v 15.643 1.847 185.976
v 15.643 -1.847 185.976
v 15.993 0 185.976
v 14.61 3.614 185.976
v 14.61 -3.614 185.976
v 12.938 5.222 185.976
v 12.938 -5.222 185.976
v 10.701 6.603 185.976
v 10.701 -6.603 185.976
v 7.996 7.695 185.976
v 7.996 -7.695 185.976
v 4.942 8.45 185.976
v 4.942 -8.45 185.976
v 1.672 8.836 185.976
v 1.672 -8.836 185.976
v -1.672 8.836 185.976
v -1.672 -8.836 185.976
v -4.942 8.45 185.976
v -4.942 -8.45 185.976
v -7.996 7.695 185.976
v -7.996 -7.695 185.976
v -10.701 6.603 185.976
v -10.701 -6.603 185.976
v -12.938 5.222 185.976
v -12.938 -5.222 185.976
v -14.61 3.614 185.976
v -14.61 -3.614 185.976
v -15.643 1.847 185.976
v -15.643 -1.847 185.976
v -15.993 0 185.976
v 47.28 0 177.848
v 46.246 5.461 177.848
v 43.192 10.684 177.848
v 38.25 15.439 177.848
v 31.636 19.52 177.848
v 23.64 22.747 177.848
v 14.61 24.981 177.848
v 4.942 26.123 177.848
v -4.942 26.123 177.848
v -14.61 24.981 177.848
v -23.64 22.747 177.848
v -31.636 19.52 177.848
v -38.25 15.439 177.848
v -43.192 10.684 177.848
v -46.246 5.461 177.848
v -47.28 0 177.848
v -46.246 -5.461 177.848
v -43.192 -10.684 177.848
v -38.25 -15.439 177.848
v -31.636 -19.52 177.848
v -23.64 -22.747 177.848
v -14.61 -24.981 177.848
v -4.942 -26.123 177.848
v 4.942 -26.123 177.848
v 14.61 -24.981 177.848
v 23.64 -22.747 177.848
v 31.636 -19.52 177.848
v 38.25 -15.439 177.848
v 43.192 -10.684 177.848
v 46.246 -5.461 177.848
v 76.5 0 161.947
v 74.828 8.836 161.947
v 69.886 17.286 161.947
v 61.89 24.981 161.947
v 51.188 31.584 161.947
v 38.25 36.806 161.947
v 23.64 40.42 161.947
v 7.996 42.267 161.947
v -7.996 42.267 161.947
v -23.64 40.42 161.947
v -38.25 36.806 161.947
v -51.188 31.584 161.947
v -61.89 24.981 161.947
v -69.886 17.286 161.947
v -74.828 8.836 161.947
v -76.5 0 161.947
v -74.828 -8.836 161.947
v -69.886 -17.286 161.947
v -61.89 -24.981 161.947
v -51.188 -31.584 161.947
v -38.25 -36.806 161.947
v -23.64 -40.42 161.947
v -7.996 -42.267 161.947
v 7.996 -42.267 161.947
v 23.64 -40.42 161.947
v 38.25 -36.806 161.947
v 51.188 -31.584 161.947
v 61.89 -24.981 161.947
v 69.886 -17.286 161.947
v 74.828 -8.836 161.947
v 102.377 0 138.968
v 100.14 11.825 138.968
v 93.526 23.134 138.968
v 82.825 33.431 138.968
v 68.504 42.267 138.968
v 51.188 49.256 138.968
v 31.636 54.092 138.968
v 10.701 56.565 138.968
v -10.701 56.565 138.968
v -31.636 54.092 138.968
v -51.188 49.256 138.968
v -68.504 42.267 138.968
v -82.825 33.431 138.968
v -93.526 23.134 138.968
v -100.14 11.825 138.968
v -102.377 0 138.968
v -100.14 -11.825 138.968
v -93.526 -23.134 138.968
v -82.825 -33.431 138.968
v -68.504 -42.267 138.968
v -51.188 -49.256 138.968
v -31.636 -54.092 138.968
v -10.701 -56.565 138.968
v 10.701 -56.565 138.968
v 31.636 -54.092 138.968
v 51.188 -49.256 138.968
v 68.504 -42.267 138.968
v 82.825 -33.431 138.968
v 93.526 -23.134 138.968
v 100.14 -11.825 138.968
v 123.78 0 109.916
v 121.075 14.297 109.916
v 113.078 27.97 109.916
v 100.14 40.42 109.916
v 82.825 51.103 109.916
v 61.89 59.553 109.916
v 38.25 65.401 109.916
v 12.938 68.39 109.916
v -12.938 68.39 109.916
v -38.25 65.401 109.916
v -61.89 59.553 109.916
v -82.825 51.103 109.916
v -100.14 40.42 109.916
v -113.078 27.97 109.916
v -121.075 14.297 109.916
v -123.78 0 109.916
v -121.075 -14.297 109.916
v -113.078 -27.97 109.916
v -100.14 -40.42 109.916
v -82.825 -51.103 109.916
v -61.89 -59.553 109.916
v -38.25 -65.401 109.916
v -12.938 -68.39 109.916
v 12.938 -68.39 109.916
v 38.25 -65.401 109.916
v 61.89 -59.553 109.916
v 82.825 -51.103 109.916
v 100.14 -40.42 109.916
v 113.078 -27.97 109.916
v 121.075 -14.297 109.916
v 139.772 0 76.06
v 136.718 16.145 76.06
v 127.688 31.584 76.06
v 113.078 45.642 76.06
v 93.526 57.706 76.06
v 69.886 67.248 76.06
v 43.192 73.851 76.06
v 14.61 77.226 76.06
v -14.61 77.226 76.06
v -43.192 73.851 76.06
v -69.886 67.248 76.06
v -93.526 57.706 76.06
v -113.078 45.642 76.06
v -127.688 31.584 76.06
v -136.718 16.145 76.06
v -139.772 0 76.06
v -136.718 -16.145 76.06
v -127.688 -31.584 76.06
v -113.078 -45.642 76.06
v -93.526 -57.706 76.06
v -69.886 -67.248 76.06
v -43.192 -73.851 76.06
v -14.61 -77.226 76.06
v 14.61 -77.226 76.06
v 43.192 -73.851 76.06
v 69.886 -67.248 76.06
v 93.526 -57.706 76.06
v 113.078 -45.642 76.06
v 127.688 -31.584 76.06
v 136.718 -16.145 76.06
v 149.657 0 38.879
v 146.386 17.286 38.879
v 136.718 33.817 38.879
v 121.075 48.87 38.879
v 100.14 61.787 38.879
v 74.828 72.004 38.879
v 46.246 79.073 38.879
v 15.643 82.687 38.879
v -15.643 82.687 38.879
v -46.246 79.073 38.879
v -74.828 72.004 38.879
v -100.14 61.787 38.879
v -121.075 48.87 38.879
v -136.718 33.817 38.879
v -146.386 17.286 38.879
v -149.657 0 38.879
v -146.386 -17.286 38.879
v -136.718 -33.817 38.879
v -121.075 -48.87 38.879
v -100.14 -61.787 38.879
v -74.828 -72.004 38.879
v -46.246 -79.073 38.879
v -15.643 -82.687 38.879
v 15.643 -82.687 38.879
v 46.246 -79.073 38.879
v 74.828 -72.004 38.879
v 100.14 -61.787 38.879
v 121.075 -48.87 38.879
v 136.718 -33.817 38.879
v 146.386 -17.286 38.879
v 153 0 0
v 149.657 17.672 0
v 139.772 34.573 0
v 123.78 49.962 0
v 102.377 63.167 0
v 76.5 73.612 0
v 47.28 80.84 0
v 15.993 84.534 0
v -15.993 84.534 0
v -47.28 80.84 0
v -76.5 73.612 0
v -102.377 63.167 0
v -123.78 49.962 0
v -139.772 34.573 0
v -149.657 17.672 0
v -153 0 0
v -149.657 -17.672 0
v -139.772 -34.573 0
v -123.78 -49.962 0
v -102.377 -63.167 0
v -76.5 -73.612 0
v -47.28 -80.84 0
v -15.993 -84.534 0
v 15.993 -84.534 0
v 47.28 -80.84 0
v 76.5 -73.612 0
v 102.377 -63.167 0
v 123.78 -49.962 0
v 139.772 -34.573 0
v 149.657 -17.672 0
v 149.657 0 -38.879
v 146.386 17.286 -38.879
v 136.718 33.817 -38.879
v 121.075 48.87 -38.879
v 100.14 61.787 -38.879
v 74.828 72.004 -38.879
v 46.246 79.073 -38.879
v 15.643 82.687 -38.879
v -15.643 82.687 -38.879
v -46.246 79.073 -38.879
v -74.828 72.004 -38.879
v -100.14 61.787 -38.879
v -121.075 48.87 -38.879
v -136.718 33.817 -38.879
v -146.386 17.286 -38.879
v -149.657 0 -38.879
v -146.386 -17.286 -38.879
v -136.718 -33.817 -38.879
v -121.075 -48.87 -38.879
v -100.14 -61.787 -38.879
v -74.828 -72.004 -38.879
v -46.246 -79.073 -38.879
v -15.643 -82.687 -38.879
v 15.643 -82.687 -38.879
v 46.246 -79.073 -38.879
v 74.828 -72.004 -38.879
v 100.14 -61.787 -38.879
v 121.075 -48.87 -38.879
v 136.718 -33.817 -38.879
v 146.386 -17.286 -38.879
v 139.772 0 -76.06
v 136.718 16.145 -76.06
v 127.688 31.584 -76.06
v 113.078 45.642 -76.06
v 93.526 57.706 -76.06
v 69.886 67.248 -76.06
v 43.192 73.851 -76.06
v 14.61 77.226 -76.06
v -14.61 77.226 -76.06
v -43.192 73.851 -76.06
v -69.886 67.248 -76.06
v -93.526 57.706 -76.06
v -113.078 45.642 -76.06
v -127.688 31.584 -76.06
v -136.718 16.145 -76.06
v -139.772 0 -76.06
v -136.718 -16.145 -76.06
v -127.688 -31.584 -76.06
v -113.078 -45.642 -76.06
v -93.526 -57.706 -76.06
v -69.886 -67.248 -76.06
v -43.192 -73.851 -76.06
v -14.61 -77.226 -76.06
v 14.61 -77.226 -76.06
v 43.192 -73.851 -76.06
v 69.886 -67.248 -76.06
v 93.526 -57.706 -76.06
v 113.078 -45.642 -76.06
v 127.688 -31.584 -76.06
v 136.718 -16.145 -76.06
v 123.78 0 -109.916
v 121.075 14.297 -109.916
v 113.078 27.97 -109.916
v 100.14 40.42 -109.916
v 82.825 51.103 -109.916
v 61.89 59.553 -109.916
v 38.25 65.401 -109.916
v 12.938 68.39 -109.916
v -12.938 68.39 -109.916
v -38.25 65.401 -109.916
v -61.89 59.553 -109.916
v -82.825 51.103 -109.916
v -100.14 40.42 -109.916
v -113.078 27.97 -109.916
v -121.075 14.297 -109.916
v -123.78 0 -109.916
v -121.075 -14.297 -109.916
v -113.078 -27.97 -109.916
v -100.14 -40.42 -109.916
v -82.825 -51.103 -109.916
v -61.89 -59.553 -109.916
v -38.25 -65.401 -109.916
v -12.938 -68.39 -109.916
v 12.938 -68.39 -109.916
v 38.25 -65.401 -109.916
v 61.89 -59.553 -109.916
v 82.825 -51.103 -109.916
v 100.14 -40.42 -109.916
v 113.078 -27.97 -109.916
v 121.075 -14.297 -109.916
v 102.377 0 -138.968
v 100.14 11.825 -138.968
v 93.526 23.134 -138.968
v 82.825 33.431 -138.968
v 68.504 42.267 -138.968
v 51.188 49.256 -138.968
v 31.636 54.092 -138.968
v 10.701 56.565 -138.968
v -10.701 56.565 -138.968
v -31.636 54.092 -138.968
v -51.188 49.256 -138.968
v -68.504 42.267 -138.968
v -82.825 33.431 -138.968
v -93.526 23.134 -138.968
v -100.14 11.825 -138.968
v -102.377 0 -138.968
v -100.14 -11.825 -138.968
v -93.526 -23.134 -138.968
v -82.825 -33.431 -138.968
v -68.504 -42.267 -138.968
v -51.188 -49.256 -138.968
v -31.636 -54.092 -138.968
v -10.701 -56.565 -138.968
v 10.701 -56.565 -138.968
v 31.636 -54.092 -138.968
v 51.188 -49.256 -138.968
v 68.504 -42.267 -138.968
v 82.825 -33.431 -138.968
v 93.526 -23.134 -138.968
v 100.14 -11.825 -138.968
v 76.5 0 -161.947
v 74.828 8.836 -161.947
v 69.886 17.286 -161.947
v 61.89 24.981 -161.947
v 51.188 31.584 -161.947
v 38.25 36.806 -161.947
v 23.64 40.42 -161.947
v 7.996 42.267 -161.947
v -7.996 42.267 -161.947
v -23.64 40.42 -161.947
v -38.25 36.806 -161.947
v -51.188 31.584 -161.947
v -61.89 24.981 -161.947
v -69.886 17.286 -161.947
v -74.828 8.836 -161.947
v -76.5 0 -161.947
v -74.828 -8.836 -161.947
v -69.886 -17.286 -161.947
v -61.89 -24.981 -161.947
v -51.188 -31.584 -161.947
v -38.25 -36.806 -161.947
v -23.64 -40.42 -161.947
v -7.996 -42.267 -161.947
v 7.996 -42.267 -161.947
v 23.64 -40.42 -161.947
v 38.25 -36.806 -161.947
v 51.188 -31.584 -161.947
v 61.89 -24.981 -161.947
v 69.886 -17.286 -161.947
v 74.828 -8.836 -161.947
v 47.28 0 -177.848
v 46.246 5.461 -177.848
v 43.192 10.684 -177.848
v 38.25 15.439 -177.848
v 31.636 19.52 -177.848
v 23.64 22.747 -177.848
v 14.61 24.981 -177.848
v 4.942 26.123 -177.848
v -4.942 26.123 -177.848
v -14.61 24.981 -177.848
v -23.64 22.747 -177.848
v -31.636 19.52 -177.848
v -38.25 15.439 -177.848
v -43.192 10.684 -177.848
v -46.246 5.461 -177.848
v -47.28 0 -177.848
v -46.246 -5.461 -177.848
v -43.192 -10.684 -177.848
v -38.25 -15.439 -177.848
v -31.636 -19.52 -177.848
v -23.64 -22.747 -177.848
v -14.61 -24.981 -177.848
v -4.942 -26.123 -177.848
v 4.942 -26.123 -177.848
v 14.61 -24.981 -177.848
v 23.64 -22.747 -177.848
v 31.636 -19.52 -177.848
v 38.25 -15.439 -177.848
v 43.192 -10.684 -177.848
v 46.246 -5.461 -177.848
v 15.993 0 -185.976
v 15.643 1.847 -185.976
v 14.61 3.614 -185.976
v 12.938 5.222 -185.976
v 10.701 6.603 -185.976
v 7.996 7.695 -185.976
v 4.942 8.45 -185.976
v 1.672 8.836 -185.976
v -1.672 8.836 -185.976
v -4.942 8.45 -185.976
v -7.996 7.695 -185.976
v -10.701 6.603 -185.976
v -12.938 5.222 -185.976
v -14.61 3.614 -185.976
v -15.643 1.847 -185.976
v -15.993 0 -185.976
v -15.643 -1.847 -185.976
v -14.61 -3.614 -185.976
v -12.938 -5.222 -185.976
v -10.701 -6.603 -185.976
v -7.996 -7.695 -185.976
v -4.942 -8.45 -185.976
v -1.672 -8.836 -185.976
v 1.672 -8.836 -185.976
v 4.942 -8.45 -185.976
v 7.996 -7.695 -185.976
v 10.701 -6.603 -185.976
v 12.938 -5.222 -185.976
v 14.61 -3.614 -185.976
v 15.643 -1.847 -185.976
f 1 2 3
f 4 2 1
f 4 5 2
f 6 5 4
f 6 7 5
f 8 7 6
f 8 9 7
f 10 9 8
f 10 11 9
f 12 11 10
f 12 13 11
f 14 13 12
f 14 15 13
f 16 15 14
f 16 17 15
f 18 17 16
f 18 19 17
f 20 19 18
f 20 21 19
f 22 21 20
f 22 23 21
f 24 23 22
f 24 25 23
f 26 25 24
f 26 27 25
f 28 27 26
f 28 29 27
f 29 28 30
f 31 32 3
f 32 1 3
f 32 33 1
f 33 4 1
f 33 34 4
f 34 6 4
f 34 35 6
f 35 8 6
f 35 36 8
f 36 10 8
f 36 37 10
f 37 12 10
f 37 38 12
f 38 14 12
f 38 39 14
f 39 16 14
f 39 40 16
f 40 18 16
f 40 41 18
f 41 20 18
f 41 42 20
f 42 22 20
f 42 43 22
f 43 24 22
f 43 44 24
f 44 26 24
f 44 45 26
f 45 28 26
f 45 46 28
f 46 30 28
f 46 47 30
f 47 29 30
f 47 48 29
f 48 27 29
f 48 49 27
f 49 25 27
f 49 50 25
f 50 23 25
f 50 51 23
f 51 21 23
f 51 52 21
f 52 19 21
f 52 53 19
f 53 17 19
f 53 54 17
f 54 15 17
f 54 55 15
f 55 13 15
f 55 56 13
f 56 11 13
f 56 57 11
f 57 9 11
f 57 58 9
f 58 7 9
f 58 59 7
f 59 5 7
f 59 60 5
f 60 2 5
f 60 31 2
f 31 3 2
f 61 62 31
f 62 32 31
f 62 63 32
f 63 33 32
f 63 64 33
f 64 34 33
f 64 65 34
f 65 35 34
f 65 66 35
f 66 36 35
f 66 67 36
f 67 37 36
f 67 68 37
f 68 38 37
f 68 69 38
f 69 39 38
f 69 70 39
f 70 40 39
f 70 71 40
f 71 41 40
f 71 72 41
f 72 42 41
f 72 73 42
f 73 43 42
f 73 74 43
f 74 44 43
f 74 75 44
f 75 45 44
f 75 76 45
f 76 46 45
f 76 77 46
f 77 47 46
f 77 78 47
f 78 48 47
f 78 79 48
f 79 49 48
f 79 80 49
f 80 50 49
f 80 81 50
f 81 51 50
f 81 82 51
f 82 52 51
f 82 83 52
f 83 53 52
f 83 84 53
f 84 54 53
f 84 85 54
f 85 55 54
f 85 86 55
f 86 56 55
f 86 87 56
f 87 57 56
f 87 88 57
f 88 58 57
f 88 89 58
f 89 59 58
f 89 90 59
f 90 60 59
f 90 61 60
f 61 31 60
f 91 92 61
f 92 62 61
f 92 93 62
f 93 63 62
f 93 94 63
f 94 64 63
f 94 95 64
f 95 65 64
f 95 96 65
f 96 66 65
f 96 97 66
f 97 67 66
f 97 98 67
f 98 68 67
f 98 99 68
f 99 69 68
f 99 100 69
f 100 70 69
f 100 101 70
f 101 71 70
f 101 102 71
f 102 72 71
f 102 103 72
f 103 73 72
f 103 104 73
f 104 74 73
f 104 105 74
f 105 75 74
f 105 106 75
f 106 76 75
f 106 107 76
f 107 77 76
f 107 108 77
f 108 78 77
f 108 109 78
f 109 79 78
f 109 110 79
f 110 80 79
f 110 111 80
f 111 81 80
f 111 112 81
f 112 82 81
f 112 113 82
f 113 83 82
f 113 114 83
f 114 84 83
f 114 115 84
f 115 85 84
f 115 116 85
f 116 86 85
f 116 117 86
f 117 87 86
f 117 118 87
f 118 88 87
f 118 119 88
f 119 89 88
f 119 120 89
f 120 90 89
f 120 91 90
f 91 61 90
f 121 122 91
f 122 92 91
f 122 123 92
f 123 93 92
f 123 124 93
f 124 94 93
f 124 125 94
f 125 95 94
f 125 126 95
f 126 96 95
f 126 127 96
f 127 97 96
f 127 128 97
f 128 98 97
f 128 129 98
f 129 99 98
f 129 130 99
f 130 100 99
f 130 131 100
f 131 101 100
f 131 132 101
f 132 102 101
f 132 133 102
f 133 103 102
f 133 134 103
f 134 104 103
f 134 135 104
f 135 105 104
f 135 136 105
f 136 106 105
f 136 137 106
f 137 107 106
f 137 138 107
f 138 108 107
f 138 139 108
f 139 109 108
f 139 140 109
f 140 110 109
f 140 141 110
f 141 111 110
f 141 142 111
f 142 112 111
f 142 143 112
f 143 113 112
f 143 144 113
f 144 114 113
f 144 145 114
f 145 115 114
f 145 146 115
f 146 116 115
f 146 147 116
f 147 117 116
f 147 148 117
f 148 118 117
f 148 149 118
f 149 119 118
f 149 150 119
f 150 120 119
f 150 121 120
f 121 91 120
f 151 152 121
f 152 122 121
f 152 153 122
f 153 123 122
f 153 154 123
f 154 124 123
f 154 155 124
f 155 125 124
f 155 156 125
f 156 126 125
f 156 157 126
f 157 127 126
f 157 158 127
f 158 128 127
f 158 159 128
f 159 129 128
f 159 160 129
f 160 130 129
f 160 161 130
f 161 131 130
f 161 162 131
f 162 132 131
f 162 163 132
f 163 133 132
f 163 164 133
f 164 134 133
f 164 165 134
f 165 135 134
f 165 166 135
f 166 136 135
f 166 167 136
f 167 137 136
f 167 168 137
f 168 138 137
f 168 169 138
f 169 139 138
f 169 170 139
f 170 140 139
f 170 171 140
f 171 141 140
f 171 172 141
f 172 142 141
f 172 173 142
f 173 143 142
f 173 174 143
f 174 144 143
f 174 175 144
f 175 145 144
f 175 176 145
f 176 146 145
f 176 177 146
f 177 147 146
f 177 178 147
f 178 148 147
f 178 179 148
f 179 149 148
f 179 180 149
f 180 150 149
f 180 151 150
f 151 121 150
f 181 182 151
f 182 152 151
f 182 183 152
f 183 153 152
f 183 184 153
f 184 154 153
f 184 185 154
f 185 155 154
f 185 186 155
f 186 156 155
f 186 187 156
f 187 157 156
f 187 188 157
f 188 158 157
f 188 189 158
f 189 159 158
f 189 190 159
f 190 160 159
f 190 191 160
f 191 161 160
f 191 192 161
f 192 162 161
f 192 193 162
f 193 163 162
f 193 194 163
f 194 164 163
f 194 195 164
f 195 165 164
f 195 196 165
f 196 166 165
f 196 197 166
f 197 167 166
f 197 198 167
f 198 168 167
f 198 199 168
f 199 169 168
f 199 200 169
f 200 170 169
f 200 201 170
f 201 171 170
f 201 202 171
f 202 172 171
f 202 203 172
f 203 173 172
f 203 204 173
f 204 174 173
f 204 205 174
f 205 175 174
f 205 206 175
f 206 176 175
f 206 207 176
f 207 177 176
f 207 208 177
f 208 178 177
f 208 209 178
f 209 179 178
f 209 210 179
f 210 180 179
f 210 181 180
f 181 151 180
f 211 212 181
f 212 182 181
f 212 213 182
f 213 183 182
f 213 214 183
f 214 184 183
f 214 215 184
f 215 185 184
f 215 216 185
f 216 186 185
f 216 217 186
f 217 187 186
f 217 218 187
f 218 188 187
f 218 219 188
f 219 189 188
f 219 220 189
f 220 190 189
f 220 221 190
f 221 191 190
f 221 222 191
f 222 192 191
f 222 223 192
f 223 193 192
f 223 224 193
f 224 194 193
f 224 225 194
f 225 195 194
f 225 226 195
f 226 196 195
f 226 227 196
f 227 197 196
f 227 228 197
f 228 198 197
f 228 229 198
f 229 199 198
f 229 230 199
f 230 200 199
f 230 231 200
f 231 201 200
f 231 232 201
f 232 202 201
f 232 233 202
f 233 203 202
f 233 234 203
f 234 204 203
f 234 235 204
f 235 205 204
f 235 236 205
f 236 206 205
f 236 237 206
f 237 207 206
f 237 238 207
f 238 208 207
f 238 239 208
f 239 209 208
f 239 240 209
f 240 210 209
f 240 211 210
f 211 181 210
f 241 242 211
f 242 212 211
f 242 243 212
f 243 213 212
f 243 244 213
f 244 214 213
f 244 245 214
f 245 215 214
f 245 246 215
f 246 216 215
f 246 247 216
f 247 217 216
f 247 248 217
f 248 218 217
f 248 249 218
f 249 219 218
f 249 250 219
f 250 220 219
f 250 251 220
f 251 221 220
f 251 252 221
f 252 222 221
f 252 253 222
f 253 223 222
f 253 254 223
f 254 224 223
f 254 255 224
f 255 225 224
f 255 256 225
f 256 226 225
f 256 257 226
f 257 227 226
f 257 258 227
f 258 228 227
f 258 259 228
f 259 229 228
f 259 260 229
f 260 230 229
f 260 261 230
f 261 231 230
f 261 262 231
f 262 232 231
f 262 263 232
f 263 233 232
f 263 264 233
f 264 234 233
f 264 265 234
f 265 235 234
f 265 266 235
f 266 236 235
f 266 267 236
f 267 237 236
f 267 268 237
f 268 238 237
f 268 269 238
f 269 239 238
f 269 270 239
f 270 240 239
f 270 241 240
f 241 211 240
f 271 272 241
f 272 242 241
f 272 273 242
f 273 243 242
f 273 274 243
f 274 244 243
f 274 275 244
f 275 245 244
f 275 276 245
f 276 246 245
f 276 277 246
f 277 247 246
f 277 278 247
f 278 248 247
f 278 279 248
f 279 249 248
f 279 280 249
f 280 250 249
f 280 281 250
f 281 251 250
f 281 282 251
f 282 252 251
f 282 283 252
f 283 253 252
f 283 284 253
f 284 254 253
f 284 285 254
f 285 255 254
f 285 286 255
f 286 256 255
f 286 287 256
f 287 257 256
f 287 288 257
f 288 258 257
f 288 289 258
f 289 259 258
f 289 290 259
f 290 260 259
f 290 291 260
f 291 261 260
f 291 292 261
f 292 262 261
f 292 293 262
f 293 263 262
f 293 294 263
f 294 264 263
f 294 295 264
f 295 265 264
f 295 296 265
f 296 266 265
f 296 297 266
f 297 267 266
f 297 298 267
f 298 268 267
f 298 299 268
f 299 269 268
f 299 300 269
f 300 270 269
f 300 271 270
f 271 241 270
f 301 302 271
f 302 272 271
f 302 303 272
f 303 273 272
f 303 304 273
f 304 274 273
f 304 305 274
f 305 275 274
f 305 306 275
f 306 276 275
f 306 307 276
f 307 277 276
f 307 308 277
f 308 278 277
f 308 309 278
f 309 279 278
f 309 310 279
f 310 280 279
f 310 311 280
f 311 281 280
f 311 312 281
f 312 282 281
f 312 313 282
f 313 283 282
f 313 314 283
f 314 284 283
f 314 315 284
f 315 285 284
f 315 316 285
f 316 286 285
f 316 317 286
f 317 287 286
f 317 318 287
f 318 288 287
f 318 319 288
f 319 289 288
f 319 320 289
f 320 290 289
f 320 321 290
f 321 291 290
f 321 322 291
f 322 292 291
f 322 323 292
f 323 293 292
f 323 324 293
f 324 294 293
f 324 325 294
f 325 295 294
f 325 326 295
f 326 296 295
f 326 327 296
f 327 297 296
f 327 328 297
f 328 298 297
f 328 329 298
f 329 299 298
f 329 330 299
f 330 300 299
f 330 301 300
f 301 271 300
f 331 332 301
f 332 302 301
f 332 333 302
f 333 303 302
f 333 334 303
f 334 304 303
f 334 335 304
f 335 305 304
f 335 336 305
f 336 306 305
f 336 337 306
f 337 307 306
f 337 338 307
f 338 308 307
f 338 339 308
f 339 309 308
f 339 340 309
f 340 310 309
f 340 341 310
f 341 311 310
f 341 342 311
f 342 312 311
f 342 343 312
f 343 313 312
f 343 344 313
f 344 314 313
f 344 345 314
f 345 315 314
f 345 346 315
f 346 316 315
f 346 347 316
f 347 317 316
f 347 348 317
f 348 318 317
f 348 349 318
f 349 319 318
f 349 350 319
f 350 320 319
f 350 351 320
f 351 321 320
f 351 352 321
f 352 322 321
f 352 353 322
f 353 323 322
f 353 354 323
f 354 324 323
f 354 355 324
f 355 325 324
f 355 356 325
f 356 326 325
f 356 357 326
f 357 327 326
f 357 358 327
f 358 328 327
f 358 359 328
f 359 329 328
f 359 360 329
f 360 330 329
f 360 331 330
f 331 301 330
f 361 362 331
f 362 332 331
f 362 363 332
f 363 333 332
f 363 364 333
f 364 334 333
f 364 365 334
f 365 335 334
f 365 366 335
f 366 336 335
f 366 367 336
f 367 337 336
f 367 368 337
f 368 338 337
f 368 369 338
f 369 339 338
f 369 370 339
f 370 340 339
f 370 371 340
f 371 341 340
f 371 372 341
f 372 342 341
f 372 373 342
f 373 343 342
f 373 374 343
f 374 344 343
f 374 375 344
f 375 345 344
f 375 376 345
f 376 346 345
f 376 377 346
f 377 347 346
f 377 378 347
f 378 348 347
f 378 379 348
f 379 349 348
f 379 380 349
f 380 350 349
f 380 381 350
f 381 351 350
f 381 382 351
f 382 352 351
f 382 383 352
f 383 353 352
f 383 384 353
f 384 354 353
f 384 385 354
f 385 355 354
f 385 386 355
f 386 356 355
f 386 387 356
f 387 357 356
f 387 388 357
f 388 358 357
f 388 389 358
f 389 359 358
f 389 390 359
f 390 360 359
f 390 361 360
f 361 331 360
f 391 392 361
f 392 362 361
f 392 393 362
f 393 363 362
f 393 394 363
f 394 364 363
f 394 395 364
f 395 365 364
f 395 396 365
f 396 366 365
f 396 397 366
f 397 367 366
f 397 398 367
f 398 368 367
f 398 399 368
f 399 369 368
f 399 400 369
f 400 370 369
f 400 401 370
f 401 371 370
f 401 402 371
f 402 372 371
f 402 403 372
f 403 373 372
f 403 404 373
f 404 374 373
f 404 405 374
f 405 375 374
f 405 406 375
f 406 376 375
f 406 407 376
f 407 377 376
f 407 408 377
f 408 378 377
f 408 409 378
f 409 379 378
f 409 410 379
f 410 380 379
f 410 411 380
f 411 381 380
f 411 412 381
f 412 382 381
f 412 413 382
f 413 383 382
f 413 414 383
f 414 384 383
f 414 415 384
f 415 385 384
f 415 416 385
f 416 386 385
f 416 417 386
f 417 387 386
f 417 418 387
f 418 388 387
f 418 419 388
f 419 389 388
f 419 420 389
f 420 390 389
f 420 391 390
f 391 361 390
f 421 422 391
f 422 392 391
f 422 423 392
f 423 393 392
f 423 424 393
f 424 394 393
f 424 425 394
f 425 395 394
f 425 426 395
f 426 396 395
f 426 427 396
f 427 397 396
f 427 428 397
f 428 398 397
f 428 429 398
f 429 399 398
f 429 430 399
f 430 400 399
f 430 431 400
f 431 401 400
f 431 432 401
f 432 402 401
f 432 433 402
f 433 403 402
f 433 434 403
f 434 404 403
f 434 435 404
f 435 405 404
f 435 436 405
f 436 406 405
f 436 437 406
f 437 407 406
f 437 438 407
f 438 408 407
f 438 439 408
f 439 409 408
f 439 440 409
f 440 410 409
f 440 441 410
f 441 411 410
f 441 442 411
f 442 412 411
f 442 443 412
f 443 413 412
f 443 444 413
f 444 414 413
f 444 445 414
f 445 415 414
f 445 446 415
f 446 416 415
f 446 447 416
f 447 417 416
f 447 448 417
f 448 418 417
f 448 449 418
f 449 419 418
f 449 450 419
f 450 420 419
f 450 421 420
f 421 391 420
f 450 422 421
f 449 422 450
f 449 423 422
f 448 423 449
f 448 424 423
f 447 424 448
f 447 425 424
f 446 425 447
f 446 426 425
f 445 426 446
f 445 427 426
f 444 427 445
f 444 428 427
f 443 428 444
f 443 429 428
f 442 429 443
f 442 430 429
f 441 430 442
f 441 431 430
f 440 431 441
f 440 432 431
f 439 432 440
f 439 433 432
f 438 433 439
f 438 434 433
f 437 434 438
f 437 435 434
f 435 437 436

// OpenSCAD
// Generated by SolidPython 1.0.1 on 2020-07-29 00:46:48


scale(v = [9, 5, 11]) {
	sphere(r = 17);
}
/***********************************************
*********      SolidPython code:      **********
************************************************
 
# import packages: SolidPython
from solid import *
from solid.utils import *
from itertools import chain, combinations, permutations


class Resize:

    def __init__(self, scad_file):
        self.scad_file = scad_file
        #self.scad_file = import_scad(scad_file)
        # cone/cylinder param:
        self.r1 = 0
        self.r2 = 0
        self.h = 0
        # rectangular prism param:
        self.w = 0
        self.l = 0
        # ellipse param:
        self.r = 0

    # import OpenScad code (file name corresponds to shape)


    # classify shape + parameters
    def assign(self, param1, param2, param3):
        if self.scad_file == 'cone.scad':
            self.r1 = param1
            self.r2 = param2
            self.h = param3
        elif self.scad_file == 'cylinder.scad':
            self.r1 = param1
            self.r2 = param2
            self.h = param3
        elif self.scad_file == 'rectangularPrism.scad':
            self.h = param1
            self.l = param2
            self.w = param3
        else:
            self.r = param1
            self.h = param2

    # resize parameters
    def iterate(self):
        x = range(3, 20, 2)
        i = 1
        if self.scad_file == 'cone.scad':
            tempList = list(permutations(x, 2))
            for temp in tempList:
                param1 = temp[0]
                param2 = temp[1]
                filepath = 'produced_scad_files/' + 'cone' + str(param1) + '_' + str(param2) + '_' + '.scad'
                scad_render_to_file(cylinder(h=param1, r1=param2, r2=0), filepath)

        elif self.scad_file == 'cylinder.scad':
            tempList = list(permutations(x, 3))
            for temp in tempList:
                param1 = temp[0]
                param2 = temp[1]
                filepath = 'produced_scad_files/' + 'cylinder' + str(param1) + '_' + str(param2) + '_' + '.scad'
                scad_render_to_file(cylinder(h=param1, r1=param2, r2=param2), filepath)

        elif self.scad_file == 'rectangularPrism.scad':
            tempList = list(permutations(x, 3))
            for temp in tempList:
                param1 = temp[0]
                param2 = temp[1]
                param3 = temp[2]
                filepath = 'produced_scad_files/' + 'rectangularPrism' + str(param1) + '_' + str(param2) + '_' + str(
                    param3) + '.scad'
                scad_render_to_file(cube(size=(param1, param2, param3)), filepath)

        elif self.scad_file == 'ellipse.scad':
            tempList = list(permutations(x, 4))
            for temp in tempList:
                param1 = temp[0]
                param2 = temp[1]
                param3 = temp[2]
                param4 = temp[3]
                filepath = 'produced_scad_files/' + 'ellipse' + str(param1) + '_' + str(param2) + '_' + str(param3) + '_' + str(param4) + '.scad'
                scad_render_to_file(scale([param1, param2, param3])(sphere(r=param4)), filepath)

    def render_to_scadfile(self):
        scad_render_to_file(scad, 'example.scad') 
 
************************************************/
